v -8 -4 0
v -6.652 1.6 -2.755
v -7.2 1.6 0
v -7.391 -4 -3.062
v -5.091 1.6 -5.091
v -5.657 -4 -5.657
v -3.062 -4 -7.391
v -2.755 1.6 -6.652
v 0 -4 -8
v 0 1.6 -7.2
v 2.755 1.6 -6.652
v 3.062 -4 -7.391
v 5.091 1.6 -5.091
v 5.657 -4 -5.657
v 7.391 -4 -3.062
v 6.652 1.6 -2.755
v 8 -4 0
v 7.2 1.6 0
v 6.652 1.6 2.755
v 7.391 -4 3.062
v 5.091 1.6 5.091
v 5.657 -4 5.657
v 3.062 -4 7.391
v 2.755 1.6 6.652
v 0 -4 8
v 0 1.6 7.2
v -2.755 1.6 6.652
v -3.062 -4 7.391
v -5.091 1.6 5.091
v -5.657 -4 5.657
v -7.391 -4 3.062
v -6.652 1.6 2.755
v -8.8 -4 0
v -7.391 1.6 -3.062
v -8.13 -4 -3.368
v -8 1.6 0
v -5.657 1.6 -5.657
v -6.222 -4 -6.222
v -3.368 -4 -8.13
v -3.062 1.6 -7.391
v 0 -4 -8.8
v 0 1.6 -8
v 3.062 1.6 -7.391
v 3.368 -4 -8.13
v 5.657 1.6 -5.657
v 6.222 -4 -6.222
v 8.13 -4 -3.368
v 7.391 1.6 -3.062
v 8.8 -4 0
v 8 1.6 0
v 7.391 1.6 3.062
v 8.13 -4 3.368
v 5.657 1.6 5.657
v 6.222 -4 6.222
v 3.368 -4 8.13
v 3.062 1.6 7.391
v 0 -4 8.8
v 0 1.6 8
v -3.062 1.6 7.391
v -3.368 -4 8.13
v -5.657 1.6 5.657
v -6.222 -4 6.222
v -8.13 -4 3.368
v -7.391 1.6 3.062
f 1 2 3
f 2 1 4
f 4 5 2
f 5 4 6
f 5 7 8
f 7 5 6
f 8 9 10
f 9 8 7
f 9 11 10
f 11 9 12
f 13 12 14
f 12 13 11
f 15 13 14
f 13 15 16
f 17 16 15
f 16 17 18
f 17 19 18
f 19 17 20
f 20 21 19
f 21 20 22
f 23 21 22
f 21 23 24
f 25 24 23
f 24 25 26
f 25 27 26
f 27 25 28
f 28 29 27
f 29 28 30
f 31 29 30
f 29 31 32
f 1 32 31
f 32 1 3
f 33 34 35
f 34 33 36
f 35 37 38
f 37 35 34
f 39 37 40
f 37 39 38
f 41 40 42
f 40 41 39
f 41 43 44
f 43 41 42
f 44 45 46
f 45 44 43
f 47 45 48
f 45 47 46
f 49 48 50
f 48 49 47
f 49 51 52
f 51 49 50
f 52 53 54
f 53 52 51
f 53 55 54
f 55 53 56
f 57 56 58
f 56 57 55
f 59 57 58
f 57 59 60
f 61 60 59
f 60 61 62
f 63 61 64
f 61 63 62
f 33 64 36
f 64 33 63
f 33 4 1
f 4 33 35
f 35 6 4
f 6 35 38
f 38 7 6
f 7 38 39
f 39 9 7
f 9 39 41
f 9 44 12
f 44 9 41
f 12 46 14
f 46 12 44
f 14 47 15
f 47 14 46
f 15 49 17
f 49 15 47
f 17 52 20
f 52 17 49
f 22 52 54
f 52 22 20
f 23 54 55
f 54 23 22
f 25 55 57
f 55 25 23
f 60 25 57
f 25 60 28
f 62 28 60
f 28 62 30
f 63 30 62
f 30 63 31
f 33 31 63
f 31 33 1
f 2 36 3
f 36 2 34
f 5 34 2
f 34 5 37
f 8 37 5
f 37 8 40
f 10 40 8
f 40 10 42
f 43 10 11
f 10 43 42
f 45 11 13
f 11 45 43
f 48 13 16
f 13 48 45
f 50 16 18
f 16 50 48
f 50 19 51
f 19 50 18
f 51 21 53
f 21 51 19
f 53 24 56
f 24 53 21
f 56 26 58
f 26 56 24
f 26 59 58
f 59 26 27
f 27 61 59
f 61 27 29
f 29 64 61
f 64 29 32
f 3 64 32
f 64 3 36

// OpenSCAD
// file: ../p/4-4ring9.scad
use <../lib.scad>
function ldraw_lib__4_4ring9() = [
// 0 Ring  9 x 1.0
// 0 Name: 4-4ring9.dat
// 0 Author: Magnus Forsberg [MagFors]
// 0 !LDRAW_ORG Primitive UPDATE 2024-01
// 0 !LICENSE Licensed under CC BY 4.0 : see CAreadme.txt
// 
// 0 BFC CERTIFY CCW
  [0,"BFC","CERTIFY"],
  [0,"BFC","CCW"],
// 
// 0 !HISTORY 2004-04-22 [PTadmin] Official Update 2004-02
// 0 !HISTORY 2007-06-24 [PTadmin] Header formatted for Contributor Agreement
// 0 !HISTORY 2008-07-01 [PTadmin] Official Update 2008-01
// 0 !HISTORY 2024-01-04 [MagFors] Complete regeneration, original by jriley
// 0 !HISTORY 2024-01-29 [OrionP] Official Update 2024-01
// 
// 4 16 10 0 0 9.239 0 3.827 8.3151 0 3.4443 9 0 0
  [4,16,10,0,0,9.239,0,3.827,8.3151,0,3.4443,9,0,0],
// 4 16 9.239 0 3.827 7.071 0 7.071 6.3639 0 6.3639 8.3151 0 3.4443
  [4,16,9.239,0,3.827,7.071,0,7.071,6.3639,0,6.3639,8.3151,0,3.4443],
// 4 16 7.071 0 7.071 3.827 0 9.239 3.4443 0 8.3151 6.3639 0 6.3639
  [4,16,7.071,0,7.071,3.827,0,9.239,3.4443,0,8.3151,6.3639,0,6.3639],
// 4 16 3.827 0 9.239 0 0 10 0 0 9 3.4443 0 8.3151
  [4,16,3.827,0,9.239,0,0,10,0,0,9,3.4443,0,8.3151],
// 4 16 0 0 10 -3.827 0 9.239 -3.4443 0 8.3151 0 0 9
  [4,16,0,0,10,-3.827,0,9.239,-3.4443,0,8.3151,0,0,9],
// 4 16 -3.827 0 9.239 -7.071 0 7.071 -6.3639 0 6.3639 -3.4443 0 8.3151
  [4,16,-3.827,0,9.239,-7.071,0,7.071,-6.3639,0,6.3639,-3.4443,0,8.3151],
// 4 16 -7.071 0 7.071 -9.239 0 3.827 -8.3151 0 3.4443 -6.3639 0 6.3639
  [4,16,-7.071,0,7.071,-9.239,0,3.827,-8.3151,0,3.4443,-6.3639,0,6.3639],
// 4 16 -9.239 0 3.827 -10 0 0 -9 0 0 -8.3151 0 3.4443
  [4,16,-9.239,0,3.827,-10,0,0,-9,0,0,-8.3151,0,3.4443],
// 4 16 -10 0 0 -9.239 0 -3.827 -8.3151 0 -3.4443 -9 0 0
  [4,16,-10,0,0,-9.239,0,-3.827,-8.3151,0,-3.4443,-9,0,0],
// 4 16 -9.239 0 -3.827 -7.071 0 -7.071 -6.3639 0 -6.3639 -8.3151 0 -3.4443
  [4,16,-9.239,0,-3.827,-7.071,0,-7.071,-6.3639,0,-6.3639,-8.3151,0,-3.4443],
// 4 16 -7.071 0 -7.071 -3.827 0 -9.239 -3.4443 0 -8.3151 -6.3639 0 -6.3639
  [4,16,-7.071,0,-7.071,-3.827,0,-9.239,-3.4443,0,-8.3151,-6.3639,0,-6.3639],
// 4 16 -3.827 0 -9.239 0 0 -10 0 0 -9 -3.4443 0 -8.3151
  [4,16,-3.827,0,-9.239,0,0,-10,0,0,-9,-3.4443,0,-8.3151],
// 4 16 0 0 -10 3.827 0 -9.239 3.4443 0 -8.3151 0 0 -9
  [4,16,0,0,-10,3.827,0,-9.239,3.4443,0,-8.3151,0,0,-9],
// 4 16 3.827 0 -9.239 7.071 0 -7.071 6.3639 0 -6.3639 3.4443 0 -8.3151
  [4,16,3.827,0,-9.239,7.071,0,-7.071,6.3639,0,-6.3639,3.4443,0,-8.3151],
// 4 16 7.071 0 -7.071 9.239 0 -3.827 8.3151 0 -3.4443 6.3639 0 -6.3639
  [4,16,7.071,0,-7.071,9.239,0,-3.827,8.3151,0,-3.4443,6.3639,0,-6.3639],
// 4 16 9.239 0 -3.827 10 0 0 9 0 0 8.3151 0 -3.4443
  [4,16,9.239,0,-3.827,10,0,0,9,0,0,8.3151,0,-3.4443],
// 0 // Build by LDPartEditor (PrimGen 2.X)
];
module ldraw_lib__4_4ring9(step=0, col=false, unit=2/5, alt=false, line=0.2, solid=!$preview)
    makepoly(ldraw_lib__4_4ring9(), step=step, col=col, unit=unit, alt=alt, line=line, solid=solid);
ldraw_lib__4_4ring9(line=0.2);
// file: ../p/4-4ring10.scad
use <../lib.scad>
function ldraw_lib__4_4ring10() = [
// 0 Ring 10 x 1.0
// 0 Name: 4-4ring10.dat
// 0 Author: Paul Easter [pneaster]
// 0 !LDRAW_ORG Primitive UPDATE 2024-02
// 0 !LICENSE Licensed under CC BY 4.0 : see CAreadme.txt
// 
// 0 BFC CERTIFY CCW
  [0,"BFC","CERTIFY"],
  [0,"BFC","CCW"],
// 
// 0 !HISTORY 2004-04-22 [PTadmin] Official Update 2004-02
// 0 !HISTORY 2007-06-24 [PTadmin] Header formatted for Contributor Agreement
// 0 !HISTORY 2008-07-01 [PTadmin] Official Update 2008-01
// 0 !HISTORY 2010-12-19 [MagFors] Corrected with Primitive Generator 2
// 0 !HISTORY 2010-12-31 [PTadmin] Official Update 2010-03
// 0 !HISTORY 2024-03-23 [OrionP] Moved from 4-4rin10.dat
// 0 !HISTORY 2024-03-24 [OrionP] Official Update 2024-02
// 
// 4 16 11 0 0 10.1629 0 4.2097 9.239 0 3.827 10 0 0
  [4,16,11,0,0,10.1629,0,4.2097,9.239,0,3.827,10,0,0],
// 4 16 10.1629 0 4.2097 7.7781 0 7.7781 7.071 0 7.071 9.239 0 3.827
  [4,16,10.1629,0,4.2097,7.7781,0,7.7781,7.071,0,7.071,9.239,0,3.827],
// 4 16 7.7781 0 7.7781 4.2097 0 10.1629 3.827 0 9.239 7.071 0 7.071
  [4,16,7.7781,0,7.7781,4.2097,0,10.1629,3.827,0,9.239,7.071,0,7.071],
// 4 16 4.2097 0 10.1629 0 0 11 0 0 10 3.827 0 9.239
  [4,16,4.2097,0,10.1629,0,0,11,0,0,10,3.827,0,9.239],
// 4 16 0 0 11 -4.2097 0 10.1629 -3.827 0 9.239 0 0 10
  [4,16,0,0,11,-4.2097,0,10.1629,-3.827,0,9.239,0,0,10],
// 4 16 -4.2097 0 10.1629 -7.7781 0 7.7781 -7.071 0 7.071 -3.827 0 9.239
  [4,16,-4.2097,0,10.1629,-7.7781,0,7.7781,-7.071,0,7.071,-3.827,0,9.239],
// 4 16 -7.7781 0 7.7781 -10.1629 0 4.2097 -9.239 0 3.827 -7.071 0 7.071
  [4,16,-7.7781,0,7.7781,-10.1629,0,4.2097,-9.239,0,3.827,-7.071,0,7.071],
// 4 16 -10.1629 0 4.2097 -11 0 0 -10 0 0 -9.239 0 3.827
  [4,16,-10.1629,0,4.2097,-11,0,0,-10,0,0,-9.239,0,3.827],
// 4 16 -11 0 0 -10.1629 0 -4.2097 -9.239 0 -3.827 -10 0 0
  [4,16,-11,0,0,-10.1629,0,-4.2097,-9.239,0,-3.827,-10,0,0],
// 4 16 -10.1629 0 -4.2097 -7.7781 0 -7.7781 -7.071 0 -7.071 -9.239 0 -3.827
  [4,16,-10.1629,0,-4.2097,-7.7781,0,-7.7781,-7.071,0,-7.071,-9.239,0,-3.827],
// 4 16 -7.7781 0 -7.7781 -4.2097 0 -10.1629 -3.827 0 -9.239 -7.071 0 -7.071
  [4,16,-7.7781,0,-7.7781,-4.2097,0,-10.1629,-3.827,0,-9.239,-7.071,0,-7.071],
// 4 16 -4.2097 0 -10.1629 0 0 -11 0 0 -10 -3.827 0 -9.239
  [4,16,-4.2097,0,-10.1629,0,0,-11,0,0,-10,-3.827,0,-9.239],
// 4 16 0 0 -11 4.2097 0 -10.1629 3.827 0 -9.239 0 0 -10
  [4,16,0,0,-11,4.2097,0,-10.1629,3.827,0,-9.239,0,0,-10],
// 4 16 4.2097 0 -10.1629 7.7781 0 -7.7781 7.071 0 -7.071 3.827 0 -9.239
  [4,16,4.2097,0,-10.1629,7.7781,0,-7.7781,7.071,0,-7.071,3.827,0,-9.239],
// 4 16 7.7781 0 -7.7781 10.1629 0 -4.2097 9.239 0 -3.827 7.071 0 -7.071
  [4,16,7.7781,0,-7.7781,10.1629,0,-4.2097,9.239,0,-3.827,7.071,0,-7.071],
// 4 16 10.1629 0 -4.2097 11 0 0 10 0 0 9.239 0 -3.827
  [4,16,10.1629,0,-4.2097,11,0,0,10,0,0,9.239,0,-3.827],
// 0 // Build by Primitive Generator 2
// 
];
module ldraw_lib__4_4ring10(step=0, col=false, unit=2/5, alt=false, line=0.2, solid=!$preview)
    makepoly(ldraw_lib__4_4ring10(), step=step, col=col, unit=unit, alt=alt, line=line, solid=solid);
ldraw_lib__4_4ring10(line=0.2);
// file: ../p/4-4edge.scad
use <../lib.scad>
function ldraw_lib__4_4edge() = [
// 0 Circle 1.0
// 0 Name: 4-4edge.dat
// 0 Author: James Jessiman
// 0 !LDRAW_ORG Primitive UPDATE 2017-01
// 0 !LICENSE Licensed under CC BY 4.0 : see CAreadme.txt
// 
// 0 BFC CERTIFY CCW
  [0,"BFC","CERTIFY"],
  [0,"BFC","CCW"],
// 
// 0 !HISTORY 1998-12-15 [PTadmin] Official Update 1998-10
// 0 !HISTORY 2005-12-28 [PTadmin] Official Update 2005-01
// 0 !HISTORY 2007-06-24 [PTadmin] Header formatted for Contributor Agreement
// 0 !HISTORY 2008-07-01 [PTadmin] Official Update 2008-01
// 0 !HISTORY 2017-01-15 [Steffen] BFCed
// 0 !HISTORY 2017-12-30 [PTadmin] Official Update 2017-01
// 
// 
// 2 24 1 0 0 0.9239 0 0.3827
  [2,24,1,0,0,0.9239,0,0.3827],
// 2 24 0.9239 0 0.3827 0.7071 0 0.7071
  [2,24,0.9239,0,0.3827,0.7071,0,0.7071],
// 2 24 0.7071 0 0.7071 0.3827 0 0.9239
  [2,24,0.7071,0,0.7071,0.3827,0,0.9239],
// 2 24 0.3827 0 0.9239 0 0 1
  [2,24,0.3827,0,0.9239,0,0,1],
// 2 24 0 0 1 -0.3827 0 0.9239
  [2,24,0,0,1,-0.3827,0,0.9239],
// 2 24 -0.3827 0 0.9239 -0.7071 0 0.7071
  [2,24,-0.3827,0,0.9239,-0.7071,0,0.7071],
// 2 24 -0.7071 0 0.7071 -0.9239 0 0.3827
  [2,24,-0.7071,0,0.7071,-0.9239,0,0.3827],
// 2 24 -0.9239 0 0.3827 -1 0 -0
  [2,24,-0.9239,0,0.3827,-1,0,-0],
// 2 24 -1 0 -0 -0.9239 0 -0.3827
  [2,24,-1,0,-0,-0.9239,0,-0.3827],
// 2 24 -0.9239 0 -0.3827 -0.7071 0 -0.7071
  [2,24,-0.9239,0,-0.3827,-0.7071,0,-0.7071],
// 2 24 -0.7071 0 -0.7071 -0.3827 0 -0.9239
  [2,24,-0.7071,0,-0.7071,-0.3827,0,-0.9239],
// 2 24 -0.3827 0 -0.9239 0 0 -1
  [2,24,-0.3827,0,-0.9239,0,0,-1],
// 2 24 0 0 -1 0.3827 0 -0.9239
  [2,24,0,0,-1,0.3827,0,-0.9239],
// 2 24 0.3827 0 -0.9239 0.7071 0 -0.7071
  [2,24,0.3827,0,-0.9239,0.7071,0,-0.7071],
// 2 24 0.7071 0 -0.7071 0.9239 0 -0.3827
  [2,24,0.7071,0,-0.7071,0.9239,0,-0.3827],
// 2 24 0.9239 0 -0.3827 1 0 0
  [2,24,0.9239,0,-0.3827,1,0,0],
];
module ldraw_lib__4_4edge(step=0, col=false, unit=2/5, alt=false, line=0.2, solid=!$preview)
    makepoly(ldraw_lib__4_4edge(), step=step, col=col, unit=unit, alt=alt, line=line, solid=solid);
ldraw_lib__4_4edge(line=0.2);
// file: ../p/4-4con9.scad
use <../lib.scad>
function ldraw_lib__4_4con9() = [
// 0 Cone  9 x 1.0
// 0 Name: 4-4con9.dat
// 0 Author: Willy Tschager [Holly-Wood]
// 0 !LDRAW_ORG Primitive UPDATE 2024-01
// 0 !LICENSE Licensed under CC BY 4.0 : see CAreadme.txt
// 
// 0 BFC CERTIFY CCW
  [0,"BFC","CERTIFY"],
  [0,"BFC","CCW"],
// 
// 0 !HISTORY 2004-11-06 [PTadmin] Official Update 2004-04
// 0 !HISTORY 2007-06-24 [PTadmin] Header formatted for Contributor Agreement
// 0 !HISTORY 2008-07-01 [PTadmin] Official Update 2008-01
// 0 !HISTORY 2012-02-16 [Philo] Changed to CCW
// 0 !HISTORY 2012-03-30 [PTadmin] Official Update 2012-01
// 0 !HISTORY 2024-01-11 [Holly-Wood] Complete regeneration, original by jriley
// 0 !HISTORY 2024-01-29 [OrionP] Official Update 2024-01
// 
// 4 16 9 1 0 8.3151 1 3.4443 9.239 0 3.827 10 0 0
  [4,16,9,1,0,8.3151,1,3.4443,9.239,0,3.827,10,0,0],
// 4 16 8.3151 1 3.4443 6.3639 1 6.3639 7.071 0 7.071 9.239 0 3.827
  [4,16,8.3151,1,3.4443,6.3639,1,6.3639,7.071,0,7.071,9.239,0,3.827],
// 4 16 6.3639 1 6.3639 3.4443 1 8.3151 3.827 0 9.239 7.071 0 7.071
  [4,16,6.3639,1,6.3639,3.4443,1,8.3151,3.827,0,9.239,7.071,0,7.071],
// 4 16 3.4443 1 8.3151 0 1 9 0 0 10 3.827 0 9.239
  [4,16,3.4443,1,8.3151,0,1,9,0,0,10,3.827,0,9.239],
// 4 16 0 1 9 -3.4443 1 8.3151 -3.827 0 9.239 0 0 10
  [4,16,0,1,9,-3.4443,1,8.3151,-3.827,0,9.239,0,0,10],
// 4 16 -3.4443 1 8.3151 -6.3639 1 6.3639 -7.071 0 7.071 -3.827 0 9.239
  [4,16,-3.4443,1,8.3151,-6.3639,1,6.3639,-7.071,0,7.071,-3.827,0,9.239],
// 4 16 -6.3639 1 6.3639 -8.3151 1 3.4443 -9.239 0 3.827 -7.071 0 7.071
  [4,16,-6.3639,1,6.3639,-8.3151,1,3.4443,-9.239,0,3.827,-7.071,0,7.071],
// 4 16 -8.3151 1 3.4443 -9 1 0 -10 0 0 -9.239 0 3.827
  [4,16,-8.3151,1,3.4443,-9,1,0,-10,0,0,-9.239,0,3.827],
// 4 16 -9 1 0 -8.3151 1 -3.4443 -9.239 0 -3.827 -10 0 0
  [4,16,-9,1,0,-8.3151,1,-3.4443,-9.239,0,-3.827,-10,0,0],
// 4 16 -8.3151 1 -3.4443 -6.3639 1 -6.3639 -7.071 0 -7.071 -9.239 0 -3.827
  [4,16,-8.3151,1,-3.4443,-6.3639,1,-6.3639,-7.071,0,-7.071,-9.239,0,-3.827],
// 4 16 -6.3639 1 -6.3639 -3.4443 1 -8.3151 -3.827 0 -9.239 -7.071 0 -7.071
  [4,16,-6.3639,1,-6.3639,-3.4443,1,-8.3151,-3.827,0,-9.239,-7.071,0,-7.071],
// 4 16 -3.4443 1 -8.3151 0 1 -9 0 0 -10 -3.827 0 -9.239
  [4,16,-3.4443,1,-8.3151,0,1,-9,0,0,-10,-3.827,0,-9.239],
// 4 16 0 1 -9 3.4443 1 -8.3151 3.827 0 -9.239 0 0 -10
  [4,16,0,1,-9,3.4443,1,-8.3151,3.827,0,-9.239,0,0,-10],
// 4 16 3.4443 1 -8.3151 6.3639 1 -6.3639 7.071 0 -7.071 3.827 0 -9.239
  [4,16,3.4443,1,-8.3151,6.3639,1,-6.3639,7.071,0,-7.071,3.827,0,-9.239],
// 4 16 6.3639 1 -6.3639 8.3151 1 -3.4443 9.239 0 -3.827 7.071 0 -7.071
  [4,16,6.3639,1,-6.3639,8.3151,1,-3.4443,9.239,0,-3.827,7.071,0,-7.071],
// 4 16 8.3151 1 -3.4443 9 1 0 10 0 0 9.239 0 -3.827
  [4,16,8.3151,1,-3.4443,9,1,0,10,0,0,9.239,0,-3.827],
// 0 // conditional lines
// 5 24 9 1 0 10 0 0 8.3151 1 -3.4443 8.3151 1 3.4443
  [5,24,9,1,0,10,0,0,8.3151,1,-3.4443,8.3151,1,3.4443],
// 5 24 8.3151 1 3.4443 9.239 0 3.827 9 1 0 6.3639 1 6.3639
  [5,24,8.3151,1,3.4443,9.239,0,3.827,9,1,0,6.3639,1,6.3639],
// 5 24 6.3639 1 6.3639 7.071 0 7.071 8.3151 1 3.4443 3.4443 1 8.3151
  [5,24,6.3639,1,6.3639,7.071,0,7.071,8.3151,1,3.4443,3.4443,1,8.3151],
// 5 24 3.4443 1 8.3151 3.827 0 9.239 6.3639 1 6.3639 0 1 9
  [5,24,3.4443,1,8.3151,3.827,0,9.239,6.3639,1,6.3639,0,1,9],
// 5 24 0 1 9 0 0 10 3.4443 1 8.3151 -3.4443 1 8.3151
  [5,24,0,1,9,0,0,10,3.4443,1,8.3151,-3.4443,1,8.3151],
// 5 24 -3.4443 1 8.3151 -3.827 0 9.239 0 1 9 -6.3639 1 6.3639
  [5,24,-3.4443,1,8.3151,-3.827,0,9.239,0,1,9,-6.3639,1,6.3639],
// 5 24 -6.3639 1 6.3639 -7.071 0 7.071 -3.4443 1 8.3151 -8.3151 1 3.4443
  [5,24,-6.3639,1,6.3639,-7.071,0,7.071,-3.4443,1,8.3151,-8.3151,1,3.4443],
// 5 24 -8.3151 1 3.4443 -9.239 0 3.827 -6.3639 1 6.3639 -9 1 0
  [5,24,-8.3151,1,3.4443,-9.239,0,3.827,-6.3639,1,6.3639,-9,1,0],
// 5 24 -9 1 0 -10 0 0 -8.3151 1 3.4443 -8.3151 1 -3.4443
  [5,24,-9,1,0,-10,0,0,-8.3151,1,3.4443,-8.3151,1,-3.4443],
// 5 24 -8.3151 1 -3.4443 -9.239 0 -3.827 -9 1 0 -6.3639 1 -6.3639
  [5,24,-8.3151,1,-3.4443,-9.239,0,-3.827,-9,1,0,-6.3639,1,-6.3639],
// 5 24 -6.3639 1 -6.3639 -7.071 0 -7.071 -8.3151 1 -3.4443 -3.4443 1 -8.3151
  [5,24,-6.3639,1,-6.3639,-7.071,0,-7.071,-8.3151,1,-3.4443,-3.4443,1,-8.3151],
// 5 24 -3.4443 1 -8.3151 -3.827 0 -9.239 -6.3639 1 -6.3639 0 1 -9
  [5,24,-3.4443,1,-8.3151,-3.827,0,-9.239,-6.3639,1,-6.3639,0,1,-9],
// 5 24 0 1 -9 0 0 -10 -3.4443 1 -8.3151 3.4443 1 -8.3151
  [5,24,0,1,-9,0,0,-10,-3.4443,1,-8.3151,3.4443,1,-8.3151],
// 5 24 3.4443 1 -8.3151 3.827 0 -9.239 0 1 -9 6.3639 1 -6.3639
  [5,24,3.4443,1,-8.3151,3.827,0,-9.239,0,1,-9,6.3639,1,-6.3639],
// 5 24 6.3639 1 -6.3639 7.071 0 -7.071 3.4443 1 -8.3151 8.3151 1 -3.4443
  [5,24,6.3639,1,-6.3639,7.071,0,-7.071,3.4443,1,-8.3151,8.3151,1,-3.4443],
// 5 24 8.3151 1 -3.4443 9.239 0 -3.827 6.3639 1 -6.3639 9 1 0
  [5,24,8.3151,1,-3.4443,9.239,0,-3.827,6.3639,1,-6.3639,9,1,0],
// 0 // Build by LDPartEditor (PrimGen 2.X)
];
module ldraw_lib__4_4con9(step=0, col=false, unit=2/5, alt=false, line=0.2, solid=!$preview)
    makepoly(ldraw_lib__4_4con9(), step=step, col=col, unit=unit, alt=alt, line=line, solid=solid);
ldraw_lib__4_4con9(line=0.2);
// file: ../p/4-4con10.scad
use <../lib.scad>
function ldraw_lib__4_4con10() = [
// 0 Cone 10 x 1.0
// 0 Name: 4-4con10.dat
// 0 Author: Niels Karsdorp [nielsk]
// 0 !LDRAW_ORG Primitive UPDATE 2009-01
// 0 !LICENSE Licensed under CC BY 4.0 : see CAreadme.txt
// 
// 0 BFC CERTIFY CCW
  [0,"BFC","CERTIFY"],
  [0,"BFC","CCW"],
// 
// 0 !HISTORY 2009-05-02 [PTadmin] Official Update 2009-01
// 
// 
// 5 24 10 1 0 11 0 0 9.2390 1 3.8270 9.2390 1 -3.8270
  [5,24,10,1,0,11,0,0,9.2390,1,3.8270,9.2390,1,-3.8270],
// 5 24 9.2390 1 3.8270 10.1629 0 4.2097 7.0710 1 7.0710 10 1 0
  [5,24,9.2390,1,3.8270,10.1629,0,4.2097,7.0710,1,7.0710,10,1,0],
// 5 24 7.0710 1 7.0710 7.7781 0 7.7781 3.8270 1 9.2390 9.2390 1 3.8270
  [5,24,7.0710,1,7.0710,7.7781,0,7.7781,3.8270,1,9.2390,9.2390,1,3.8270],
// 5 24 3.8270 1 9.2390 4.2097 0 10.1629 0 1 10 7.0710 1 7.0710
  [5,24,3.8270,1,9.2390,4.2097,0,10.1629,0,1,10,7.0710,1,7.0710],
// 5 24 0 1 10 0 0 11 -3.8270 1 9.2390 3.8270 1 9.2390
  [5,24,0,1,10,0,0,11,-3.8270,1,9.2390,3.8270,1,9.2390],
// 5 24 -3.8270 1 9.2390 -4.2097 0 10.1629 -7.0710 1 7.0710 0 1 10
  [5,24,-3.8270,1,9.2390,-4.2097,0,10.1629,-7.0710,1,7.0710,0,1,10],
// 5 24 -7.0710 1 7.0710 -7.7781 0 7.7781 -9.2390 1 3.8270 -3.8270 1 9.2390
  [5,24,-7.0710,1,7.0710,-7.7781,0,7.7781,-9.2390,1,3.8270,-3.8270,1,9.2390],
// 5 24 -9.2390 1 3.8270 -10.1629 0 4.2097 -10 1 0 -7.0710 1 7.0710
  [5,24,-9.2390,1,3.8270,-10.1629,0,4.2097,-10,1,0,-7.0710,1,7.0710],
// 5 24 -10 1 0 -11 0 0 -9.2390 1 -3.8270 -9.2390 1 3.8270
  [5,24,-10,1,0,-11,0,0,-9.2390,1,-3.8270,-9.2390,1,3.8270],
// 5 24 -9.2390 1 -3.8270 -10.1629 0 -4.2097 -7.0710 1 -7.0710 -10 1 0
  [5,24,-9.2390,1,-3.8270,-10.1629,0,-4.2097,-7.0710,1,-7.0710,-10,1,0],
// 5 24 -7.0710 1 -7.0710 -7.7781 0 -7.7781 -3.8270 1 -9.2390 -9.2390 1 -3.8270
  [5,24,-7.0710,1,-7.0710,-7.7781,0,-7.7781,-3.8270,1,-9.2390,-9.2390,1,-3.8270],
// 5 24 -3.8270 1 -9.2390 -4.2097 0 -10.1629 0 1 -10 -7.0710 1 -7.0710
  [5,24,-3.8270,1,-9.2390,-4.2097,0,-10.1629,0,1,-10,-7.0710,1,-7.0710],
// 5 24 0 1 -10 0 0 -11 3.8270 1 -9.2390 -3.8270 1 -9.2390
  [5,24,0,1,-10,0,0,-11,3.8270,1,-9.2390,-3.8270,1,-9.2390],
// 5 24 3.8270 1 -9.2390 4.2097 0 -10.1629 7.0710 1 -7.0710 0 1 -10
  [5,24,3.8270,1,-9.2390,4.2097,0,-10.1629,7.0710,1,-7.0710,0,1,-10],
// 5 24 7.0710 1 -7.0710 7.7781 0 -7.7781 9.2390 1 -3.8270 3.8270 1 -9.2390
  [5,24,7.0710,1,-7.0710,7.7781,0,-7.7781,9.2390,1,-3.8270,3.8270,1,-9.2390],
// 5 24 9.2390 1 -3.8270 10.1629 0 -4.2097 10 1 0 7.0710 1 -7.0710
  [5,24,9.2390,1,-3.8270,10.1629,0,-4.2097,10,1,0,7.0710,1,-7.0710],
// 
// 4 16 10 1 0 9.2390 1 3.8270 10.1629 0 4.2097 11 0 0
  [4,16,10,1,0,9.2390,1,3.8270,10.1629,0,4.2097,11,0,0],
// 4 16 9.2390 1 3.8270 7.0710 1 7.0710 7.7781 0 7.7781 10.1629 0 4.2097
  [4,16,9.2390,1,3.8270,7.0710,1,7.0710,7.7781,0,7.7781,10.1629,0,4.2097],
// 4 16 7.0710 1 7.0710 3.8270 1 9.2390 4.2097 0 10.1629 7.7781 0 7.7781
  [4,16,7.0710,1,7.0710,3.8270,1,9.2390,4.2097,0,10.1629,7.7781,0,7.7781],
// 4 16 3.8270 1 9.2390 0 1 10 0 0 11 4.2097 0 10.1629
  [4,16,3.8270,1,9.2390,0,1,10,0,0,11,4.2097,0,10.1629],
// 4 16 0 1 10 -3.8270 1 9.2390 -4.2097 0 10.1629 0 0 11
  [4,16,0,1,10,-3.8270,1,9.2390,-4.2097,0,10.1629,0,0,11],
// 4 16 -3.8270 1 9.2390 -7.0710 1 7.0710 -7.7781 0 7.7781 -4.2097 0 10.1629
  [4,16,-3.8270,1,9.2390,-7.0710,1,7.0710,-7.7781,0,7.7781,-4.2097,0,10.1629],
// 4 16 -7.0710 1 7.0710 -9.2390 1 3.8270 -10.1629 0 4.2097 -7.7781 0 7.7781
  [4,16,-7.0710,1,7.0710,-9.2390,1,3.8270,-10.1629,0,4.2097,-7.7781,0,7.7781],
// 4 16 -9.2390 1 3.8270 -10 1 0 -11 0 0 -10.1629 0 4.2097
  [4,16,-9.2390,1,3.8270,-10,1,0,-11,0,0,-10.1629,0,4.2097],
// 4 16 -10 1 0 -9.2390 1 -3.8270 -10.1629 0 -4.2097 -11 0 0
  [4,16,-10,1,0,-9.2390,1,-3.8270,-10.1629,0,-4.2097,-11,0,0],
// 4 16 -9.2390 1 -3.8270 -7.0710 1 -7.0710 -7.7781 0 -7.7781 -10.1629 0 -4.2097
  [4,16,-9.2390,1,-3.8270,-7.0710,1,-7.0710,-7.7781,0,-7.7781,-10.1629,0,-4.2097],
// 4 16 -7.0710 1 -7.0710 -3.8270 1 -9.2390 -4.2097 0 -10.1629 -7.7781 0 -7.7781
  [4,16,-7.0710,1,-7.0710,-3.8270,1,-9.2390,-4.2097,0,-10.1629,-7.7781,0,-7.7781],
// 4 16 -3.8270 1 -9.2390 0 1 -10 0 0 -11 -4.2097 0 -10.1629
  [4,16,-3.8270,1,-9.2390,0,1,-10,0,0,-11,-4.2097,0,-10.1629],
// 4 16 0 1 -10 3.8270 1 -9.2390 4.2097 0 -10.1629 0 0 -11
  [4,16,0,1,-10,3.8270,1,-9.2390,4.2097,0,-10.1629,0,0,-11],
// 4 16 3.8270 1 -9.2390 7.0710 1 -7.0710 7.7781 0 -7.7781 4.2097 0 -10.1629
  [4,16,3.8270,1,-9.2390,7.0710,1,-7.0710,7.7781,0,-7.7781,4.2097,0,-10.1629],
// 4 16 7.0710 1 -7.0710 9.2390 1 -3.8270 10.1629 0 -4.2097 7.7781 0 -7.7781
  [4,16,7.0710,1,-7.0710,9.2390,1,-3.8270,10.1629,0,-4.2097,7.7781,0,-7.7781],
// 4 16 9.2390 1 -3.8270 10 1 0 11 0 0 10.1629 0 -4.2097
  [4,16,9.2390,1,-3.8270,10,1,0,11,0,0,10.1629,0,-4.2097],
// 0
// 
];
module ldraw_lib__4_4con10(step=0, col=false, unit=2/5, alt=false, line=0.2, solid=!$preview)
    makepoly(ldraw_lib__4_4con10(), step=step, col=col, unit=unit, alt=alt, line=line, solid=solid);
ldraw_lib__4_4con10(line=0.2);
// main file
use <../lib.scad>
use <../p/4-4con10.scad>
use <../p/4-4con9.scad>
use <../p/4-4edge.scad>
use <../p/4-4ring10.scad>
use <../p/4-4ring9.scad>
function ldraw_lib__458c01() = [
// 0 Tyre for Electric Train 12V Motor Conically Deformed
// 0 Name: 458c01.dat
// 0 Author: Guy Vivan [guyvivan]
// 0 !LDRAW_ORG Shortcut UPDATE 2024-02
// 0 !LICENSE Licensed under CC BY 2.0 and CC BY 4.0 : see CAreadme.txt
// 
// 0 BFC CERTIFY CW
  [0,"BFC","CERTIFY"],
  [0,"BFC","CW"],
// 
// 0 !HISTORY 2010-04-05 [PTadmin] Official Update 2010-01
// 0 !HISTORY 2024-03-23 [OrionP] Updated ring primitives
// 0 !HISTORY 2024-03-24 [OrionP] Official Update 2024-02
// 
// 0 BFC INVERTNEXT
  [0,"BFC","INVERTNEXT"],
// 1 16 0 0 -10 -2 0 0 0 0 2 0 14 0 4-4con9.dat
  [1,16,0,0,-10,-2,0,0,0,0,2,0,14,0, ldraw_lib__4_4con9()],
// 1 16 0 0 -10 -2 0 0 0 0 2 0 14 0 4-4con10.dat
  [1,16,0,0,-10,-2,0,0,0,0,2,0,14,0, ldraw_lib__4_4con10()],
// 1 16 0 0 -10 -2 0 0 0 0 2 0 1 0 4-4ring10.dat
  [1,16,0,0,-10,-2,0,0,0,0,2,0,1,0, ldraw_lib__4_4ring10()],
// 1 16 0 0 -10 -20 0 0 0 0 20 0 1 0 4-4edge.dat
  [1,16,0,0,-10,-20,0,0,0,0,20,0,1,0, ldraw_lib__4_4edge()],
// 1 16 0 0 -10 -22 0 0 0 0 22 0 1 0 4-4edge.dat
  [1,16,0,0,-10,-22,0,0,0,0,22,0,1,0, ldraw_lib__4_4edge()],
// 1 16 0 0 4 -2 0 0 0 0 2 0 -1 0 4-4ring9.dat
  [1,16,0,0,4,-2,0,0,0,0,2,0,-1,0, ldraw_lib__4_4ring9()],
// 1 16 0 0 4 18 0 0 0 0 18 0 1 0 4-4edge.dat
  [1,16,0,0,4,18,0,0,0,0,18,0,1,0, ldraw_lib__4_4edge()],
// 1 16 0 0 4 20 0 0 0 0 20 0 1 0 4-4edge.dat
  [1,16,0,0,4,20,0,0,0,0,20,0,1,0, ldraw_lib__4_4edge()],
// 0
];
module ldraw_lib__458c01(step=0, col=false, unit=2/5, alt=false, line=0.2, solid=!$preview)
    makepoly(ldraw_lib__458c01(), step=step, col=col, unit=unit, alt=alt, line=line, solid=solid);
ldraw_lib__458c01(line=0.2);
